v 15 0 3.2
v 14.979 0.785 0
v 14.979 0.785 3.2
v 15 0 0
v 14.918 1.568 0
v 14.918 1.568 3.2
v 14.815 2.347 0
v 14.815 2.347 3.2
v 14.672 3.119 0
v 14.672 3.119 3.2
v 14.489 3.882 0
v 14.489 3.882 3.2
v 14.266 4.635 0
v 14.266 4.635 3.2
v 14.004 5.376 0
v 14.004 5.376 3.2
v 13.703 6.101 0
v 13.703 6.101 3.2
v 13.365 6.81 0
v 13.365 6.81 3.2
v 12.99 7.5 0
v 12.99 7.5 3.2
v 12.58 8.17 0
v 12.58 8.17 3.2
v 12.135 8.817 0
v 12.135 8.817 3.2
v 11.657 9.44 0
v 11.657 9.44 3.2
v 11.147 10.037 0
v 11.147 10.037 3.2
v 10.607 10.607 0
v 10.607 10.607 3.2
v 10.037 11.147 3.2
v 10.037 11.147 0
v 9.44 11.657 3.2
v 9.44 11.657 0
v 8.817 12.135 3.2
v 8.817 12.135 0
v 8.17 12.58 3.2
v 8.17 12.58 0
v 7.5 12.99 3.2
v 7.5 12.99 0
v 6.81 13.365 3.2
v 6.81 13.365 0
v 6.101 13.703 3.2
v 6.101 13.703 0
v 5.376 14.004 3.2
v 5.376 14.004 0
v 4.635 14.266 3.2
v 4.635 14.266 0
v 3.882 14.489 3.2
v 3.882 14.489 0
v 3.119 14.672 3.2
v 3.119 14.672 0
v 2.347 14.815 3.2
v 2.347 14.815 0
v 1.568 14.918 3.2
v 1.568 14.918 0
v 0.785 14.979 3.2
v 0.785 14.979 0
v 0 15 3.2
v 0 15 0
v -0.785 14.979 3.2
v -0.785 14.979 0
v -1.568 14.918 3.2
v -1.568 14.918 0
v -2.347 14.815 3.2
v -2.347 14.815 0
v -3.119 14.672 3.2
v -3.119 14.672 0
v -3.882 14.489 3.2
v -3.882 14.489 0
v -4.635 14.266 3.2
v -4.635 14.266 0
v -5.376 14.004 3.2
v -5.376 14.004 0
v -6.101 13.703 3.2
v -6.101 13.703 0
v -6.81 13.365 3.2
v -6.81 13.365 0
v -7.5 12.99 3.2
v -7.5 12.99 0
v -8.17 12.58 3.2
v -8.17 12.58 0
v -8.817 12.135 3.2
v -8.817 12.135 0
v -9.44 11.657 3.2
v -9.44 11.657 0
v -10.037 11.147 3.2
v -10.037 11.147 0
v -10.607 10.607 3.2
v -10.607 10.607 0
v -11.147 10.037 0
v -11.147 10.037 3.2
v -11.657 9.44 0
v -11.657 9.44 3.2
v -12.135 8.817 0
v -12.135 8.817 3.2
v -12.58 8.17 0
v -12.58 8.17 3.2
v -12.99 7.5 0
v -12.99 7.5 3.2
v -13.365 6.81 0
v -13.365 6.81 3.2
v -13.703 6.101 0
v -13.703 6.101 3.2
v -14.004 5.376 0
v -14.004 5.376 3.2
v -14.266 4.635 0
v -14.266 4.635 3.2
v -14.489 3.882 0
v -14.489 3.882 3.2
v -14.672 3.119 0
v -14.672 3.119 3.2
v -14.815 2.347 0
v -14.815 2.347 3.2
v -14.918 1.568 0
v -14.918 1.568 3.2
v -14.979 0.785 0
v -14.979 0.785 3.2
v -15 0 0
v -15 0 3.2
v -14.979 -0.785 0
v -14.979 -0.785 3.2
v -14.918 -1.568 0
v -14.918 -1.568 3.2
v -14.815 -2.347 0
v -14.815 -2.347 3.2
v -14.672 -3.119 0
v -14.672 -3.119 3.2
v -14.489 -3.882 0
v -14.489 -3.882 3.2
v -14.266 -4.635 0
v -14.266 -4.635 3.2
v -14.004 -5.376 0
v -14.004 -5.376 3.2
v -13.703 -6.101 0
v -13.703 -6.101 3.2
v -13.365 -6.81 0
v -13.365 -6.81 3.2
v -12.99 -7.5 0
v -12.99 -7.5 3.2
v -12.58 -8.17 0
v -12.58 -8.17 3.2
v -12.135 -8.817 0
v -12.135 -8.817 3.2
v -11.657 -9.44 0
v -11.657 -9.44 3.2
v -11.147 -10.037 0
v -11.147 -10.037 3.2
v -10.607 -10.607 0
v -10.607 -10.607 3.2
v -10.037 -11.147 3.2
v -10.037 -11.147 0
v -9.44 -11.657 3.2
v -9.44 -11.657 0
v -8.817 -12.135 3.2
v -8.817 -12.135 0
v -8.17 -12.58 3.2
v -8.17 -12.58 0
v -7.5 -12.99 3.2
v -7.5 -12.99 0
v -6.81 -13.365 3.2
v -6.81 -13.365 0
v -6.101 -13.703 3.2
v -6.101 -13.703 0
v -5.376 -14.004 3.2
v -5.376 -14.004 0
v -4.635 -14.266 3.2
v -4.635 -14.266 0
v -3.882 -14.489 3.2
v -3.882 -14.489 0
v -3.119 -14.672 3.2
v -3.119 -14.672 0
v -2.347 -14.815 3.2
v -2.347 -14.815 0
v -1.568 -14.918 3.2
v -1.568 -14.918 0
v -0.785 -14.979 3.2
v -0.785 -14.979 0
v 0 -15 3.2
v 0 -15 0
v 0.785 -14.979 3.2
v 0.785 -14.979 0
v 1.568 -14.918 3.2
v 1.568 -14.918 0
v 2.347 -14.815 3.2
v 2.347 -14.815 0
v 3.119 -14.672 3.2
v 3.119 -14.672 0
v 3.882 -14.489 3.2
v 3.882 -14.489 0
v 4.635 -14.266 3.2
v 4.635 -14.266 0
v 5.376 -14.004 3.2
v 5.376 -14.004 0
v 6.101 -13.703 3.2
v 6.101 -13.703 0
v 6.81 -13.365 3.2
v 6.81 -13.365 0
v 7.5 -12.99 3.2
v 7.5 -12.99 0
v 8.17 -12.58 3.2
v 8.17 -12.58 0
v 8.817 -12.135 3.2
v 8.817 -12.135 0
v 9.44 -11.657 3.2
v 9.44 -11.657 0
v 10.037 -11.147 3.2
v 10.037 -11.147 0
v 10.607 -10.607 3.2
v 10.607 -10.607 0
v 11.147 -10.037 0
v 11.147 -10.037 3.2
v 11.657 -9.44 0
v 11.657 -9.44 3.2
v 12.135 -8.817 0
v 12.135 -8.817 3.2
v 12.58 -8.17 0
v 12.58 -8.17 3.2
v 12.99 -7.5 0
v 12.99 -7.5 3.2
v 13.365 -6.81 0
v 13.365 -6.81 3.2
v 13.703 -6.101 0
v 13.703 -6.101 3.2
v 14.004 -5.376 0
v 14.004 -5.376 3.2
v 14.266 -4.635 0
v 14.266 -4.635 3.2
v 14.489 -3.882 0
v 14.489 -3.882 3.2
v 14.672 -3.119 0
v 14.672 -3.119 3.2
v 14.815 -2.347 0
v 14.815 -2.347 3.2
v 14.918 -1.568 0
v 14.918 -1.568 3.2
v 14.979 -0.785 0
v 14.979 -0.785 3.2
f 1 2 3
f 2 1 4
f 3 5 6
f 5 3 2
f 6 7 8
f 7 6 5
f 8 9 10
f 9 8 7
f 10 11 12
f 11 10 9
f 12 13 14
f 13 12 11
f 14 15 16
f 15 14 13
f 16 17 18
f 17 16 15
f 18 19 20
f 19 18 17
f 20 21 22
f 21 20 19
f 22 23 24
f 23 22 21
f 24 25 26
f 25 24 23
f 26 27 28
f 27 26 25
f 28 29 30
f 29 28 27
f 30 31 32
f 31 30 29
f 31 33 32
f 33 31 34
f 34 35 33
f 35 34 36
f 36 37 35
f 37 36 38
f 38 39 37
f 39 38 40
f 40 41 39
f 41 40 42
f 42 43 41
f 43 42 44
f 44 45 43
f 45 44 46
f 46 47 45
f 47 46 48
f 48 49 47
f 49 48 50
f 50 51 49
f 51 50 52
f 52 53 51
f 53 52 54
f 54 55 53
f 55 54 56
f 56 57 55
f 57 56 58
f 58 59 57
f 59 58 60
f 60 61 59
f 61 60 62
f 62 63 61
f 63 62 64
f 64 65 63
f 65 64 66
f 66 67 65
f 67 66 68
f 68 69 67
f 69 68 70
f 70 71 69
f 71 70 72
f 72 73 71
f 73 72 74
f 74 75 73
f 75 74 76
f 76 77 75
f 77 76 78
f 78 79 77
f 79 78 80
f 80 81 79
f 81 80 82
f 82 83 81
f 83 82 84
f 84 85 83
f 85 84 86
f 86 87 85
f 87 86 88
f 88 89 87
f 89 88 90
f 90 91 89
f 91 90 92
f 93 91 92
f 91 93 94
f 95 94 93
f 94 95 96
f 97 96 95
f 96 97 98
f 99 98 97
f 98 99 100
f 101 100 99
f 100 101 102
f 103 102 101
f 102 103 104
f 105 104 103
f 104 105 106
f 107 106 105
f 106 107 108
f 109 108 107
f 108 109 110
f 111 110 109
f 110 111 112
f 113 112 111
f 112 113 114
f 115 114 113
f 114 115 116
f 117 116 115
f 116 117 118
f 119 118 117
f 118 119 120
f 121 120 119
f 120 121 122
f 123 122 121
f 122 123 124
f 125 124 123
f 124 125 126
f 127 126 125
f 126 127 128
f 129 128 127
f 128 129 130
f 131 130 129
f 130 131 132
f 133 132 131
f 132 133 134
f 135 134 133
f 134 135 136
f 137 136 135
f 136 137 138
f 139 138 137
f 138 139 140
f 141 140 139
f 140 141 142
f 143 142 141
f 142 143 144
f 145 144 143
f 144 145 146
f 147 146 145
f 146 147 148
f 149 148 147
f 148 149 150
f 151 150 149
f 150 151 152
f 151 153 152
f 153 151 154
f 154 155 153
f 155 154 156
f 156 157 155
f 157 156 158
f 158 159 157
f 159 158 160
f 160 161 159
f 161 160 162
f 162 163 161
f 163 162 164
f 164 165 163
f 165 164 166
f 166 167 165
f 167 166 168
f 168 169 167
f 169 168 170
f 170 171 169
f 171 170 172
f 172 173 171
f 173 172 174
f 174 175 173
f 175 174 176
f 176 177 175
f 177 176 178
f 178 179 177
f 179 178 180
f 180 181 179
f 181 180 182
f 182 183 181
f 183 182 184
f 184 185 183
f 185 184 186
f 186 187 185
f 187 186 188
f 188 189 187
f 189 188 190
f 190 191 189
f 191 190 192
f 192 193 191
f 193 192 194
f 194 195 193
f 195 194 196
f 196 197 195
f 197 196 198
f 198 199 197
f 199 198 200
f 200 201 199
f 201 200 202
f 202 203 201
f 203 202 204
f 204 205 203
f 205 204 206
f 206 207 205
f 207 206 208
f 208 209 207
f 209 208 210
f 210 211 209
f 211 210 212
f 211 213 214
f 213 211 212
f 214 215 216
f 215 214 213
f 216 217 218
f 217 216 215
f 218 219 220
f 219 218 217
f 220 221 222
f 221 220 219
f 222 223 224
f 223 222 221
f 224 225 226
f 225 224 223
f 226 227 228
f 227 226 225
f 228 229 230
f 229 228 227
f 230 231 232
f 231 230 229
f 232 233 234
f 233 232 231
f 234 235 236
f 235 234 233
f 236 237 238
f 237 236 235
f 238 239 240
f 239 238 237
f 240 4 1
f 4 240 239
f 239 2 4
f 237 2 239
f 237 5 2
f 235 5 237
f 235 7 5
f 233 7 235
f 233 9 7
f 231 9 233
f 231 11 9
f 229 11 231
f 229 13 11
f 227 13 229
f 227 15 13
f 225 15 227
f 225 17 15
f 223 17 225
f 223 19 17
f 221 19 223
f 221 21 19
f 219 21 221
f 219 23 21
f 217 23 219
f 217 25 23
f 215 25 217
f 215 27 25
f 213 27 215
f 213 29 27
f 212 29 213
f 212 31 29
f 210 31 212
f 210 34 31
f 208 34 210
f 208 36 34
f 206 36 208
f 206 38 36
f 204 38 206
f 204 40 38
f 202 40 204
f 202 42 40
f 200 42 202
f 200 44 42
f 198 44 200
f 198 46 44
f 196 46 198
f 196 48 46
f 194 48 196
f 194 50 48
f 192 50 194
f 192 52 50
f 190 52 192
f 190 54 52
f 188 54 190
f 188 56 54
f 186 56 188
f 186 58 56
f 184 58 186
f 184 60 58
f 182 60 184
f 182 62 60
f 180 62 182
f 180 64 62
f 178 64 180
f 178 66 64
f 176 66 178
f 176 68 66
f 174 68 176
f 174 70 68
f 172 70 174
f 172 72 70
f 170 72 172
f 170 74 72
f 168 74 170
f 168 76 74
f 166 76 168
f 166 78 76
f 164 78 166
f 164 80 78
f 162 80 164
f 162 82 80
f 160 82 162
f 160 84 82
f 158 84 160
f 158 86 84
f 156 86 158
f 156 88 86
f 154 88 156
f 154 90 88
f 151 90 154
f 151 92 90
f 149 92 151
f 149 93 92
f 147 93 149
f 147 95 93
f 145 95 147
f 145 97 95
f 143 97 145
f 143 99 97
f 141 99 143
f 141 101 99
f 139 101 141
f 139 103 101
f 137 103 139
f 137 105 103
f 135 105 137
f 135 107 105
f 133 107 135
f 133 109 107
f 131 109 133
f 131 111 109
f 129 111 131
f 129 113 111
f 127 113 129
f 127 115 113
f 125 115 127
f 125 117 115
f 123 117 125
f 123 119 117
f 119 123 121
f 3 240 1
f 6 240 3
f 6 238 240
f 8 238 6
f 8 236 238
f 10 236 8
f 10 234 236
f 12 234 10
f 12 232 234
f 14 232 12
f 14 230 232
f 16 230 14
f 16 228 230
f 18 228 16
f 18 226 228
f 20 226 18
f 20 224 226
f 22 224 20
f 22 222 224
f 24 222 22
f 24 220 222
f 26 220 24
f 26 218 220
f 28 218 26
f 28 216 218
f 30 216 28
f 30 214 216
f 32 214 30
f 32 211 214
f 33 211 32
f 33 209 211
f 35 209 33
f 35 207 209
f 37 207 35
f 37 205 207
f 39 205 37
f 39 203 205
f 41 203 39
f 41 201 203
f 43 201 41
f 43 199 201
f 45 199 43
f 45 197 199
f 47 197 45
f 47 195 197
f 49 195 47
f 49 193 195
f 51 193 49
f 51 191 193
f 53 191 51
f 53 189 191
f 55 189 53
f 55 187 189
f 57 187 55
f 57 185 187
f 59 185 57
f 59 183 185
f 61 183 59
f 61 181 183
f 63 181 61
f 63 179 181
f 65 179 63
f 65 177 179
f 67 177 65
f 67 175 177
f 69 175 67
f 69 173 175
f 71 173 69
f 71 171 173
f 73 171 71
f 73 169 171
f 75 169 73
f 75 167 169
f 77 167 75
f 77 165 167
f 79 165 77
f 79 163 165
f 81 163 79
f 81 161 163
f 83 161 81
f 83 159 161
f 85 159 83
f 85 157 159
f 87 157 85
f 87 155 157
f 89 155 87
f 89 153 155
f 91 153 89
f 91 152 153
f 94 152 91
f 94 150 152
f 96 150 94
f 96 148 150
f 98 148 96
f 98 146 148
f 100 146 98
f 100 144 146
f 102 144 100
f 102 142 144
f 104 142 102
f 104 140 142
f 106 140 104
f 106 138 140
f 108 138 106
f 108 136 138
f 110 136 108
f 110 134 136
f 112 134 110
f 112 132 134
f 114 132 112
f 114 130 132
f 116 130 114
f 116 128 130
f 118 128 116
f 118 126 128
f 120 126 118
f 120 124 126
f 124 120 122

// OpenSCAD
module CoinBattery(){
  cylinder(d=30,h=3.2,$fn=120);}
$fn=64;
color("silver")CoinBattery();
